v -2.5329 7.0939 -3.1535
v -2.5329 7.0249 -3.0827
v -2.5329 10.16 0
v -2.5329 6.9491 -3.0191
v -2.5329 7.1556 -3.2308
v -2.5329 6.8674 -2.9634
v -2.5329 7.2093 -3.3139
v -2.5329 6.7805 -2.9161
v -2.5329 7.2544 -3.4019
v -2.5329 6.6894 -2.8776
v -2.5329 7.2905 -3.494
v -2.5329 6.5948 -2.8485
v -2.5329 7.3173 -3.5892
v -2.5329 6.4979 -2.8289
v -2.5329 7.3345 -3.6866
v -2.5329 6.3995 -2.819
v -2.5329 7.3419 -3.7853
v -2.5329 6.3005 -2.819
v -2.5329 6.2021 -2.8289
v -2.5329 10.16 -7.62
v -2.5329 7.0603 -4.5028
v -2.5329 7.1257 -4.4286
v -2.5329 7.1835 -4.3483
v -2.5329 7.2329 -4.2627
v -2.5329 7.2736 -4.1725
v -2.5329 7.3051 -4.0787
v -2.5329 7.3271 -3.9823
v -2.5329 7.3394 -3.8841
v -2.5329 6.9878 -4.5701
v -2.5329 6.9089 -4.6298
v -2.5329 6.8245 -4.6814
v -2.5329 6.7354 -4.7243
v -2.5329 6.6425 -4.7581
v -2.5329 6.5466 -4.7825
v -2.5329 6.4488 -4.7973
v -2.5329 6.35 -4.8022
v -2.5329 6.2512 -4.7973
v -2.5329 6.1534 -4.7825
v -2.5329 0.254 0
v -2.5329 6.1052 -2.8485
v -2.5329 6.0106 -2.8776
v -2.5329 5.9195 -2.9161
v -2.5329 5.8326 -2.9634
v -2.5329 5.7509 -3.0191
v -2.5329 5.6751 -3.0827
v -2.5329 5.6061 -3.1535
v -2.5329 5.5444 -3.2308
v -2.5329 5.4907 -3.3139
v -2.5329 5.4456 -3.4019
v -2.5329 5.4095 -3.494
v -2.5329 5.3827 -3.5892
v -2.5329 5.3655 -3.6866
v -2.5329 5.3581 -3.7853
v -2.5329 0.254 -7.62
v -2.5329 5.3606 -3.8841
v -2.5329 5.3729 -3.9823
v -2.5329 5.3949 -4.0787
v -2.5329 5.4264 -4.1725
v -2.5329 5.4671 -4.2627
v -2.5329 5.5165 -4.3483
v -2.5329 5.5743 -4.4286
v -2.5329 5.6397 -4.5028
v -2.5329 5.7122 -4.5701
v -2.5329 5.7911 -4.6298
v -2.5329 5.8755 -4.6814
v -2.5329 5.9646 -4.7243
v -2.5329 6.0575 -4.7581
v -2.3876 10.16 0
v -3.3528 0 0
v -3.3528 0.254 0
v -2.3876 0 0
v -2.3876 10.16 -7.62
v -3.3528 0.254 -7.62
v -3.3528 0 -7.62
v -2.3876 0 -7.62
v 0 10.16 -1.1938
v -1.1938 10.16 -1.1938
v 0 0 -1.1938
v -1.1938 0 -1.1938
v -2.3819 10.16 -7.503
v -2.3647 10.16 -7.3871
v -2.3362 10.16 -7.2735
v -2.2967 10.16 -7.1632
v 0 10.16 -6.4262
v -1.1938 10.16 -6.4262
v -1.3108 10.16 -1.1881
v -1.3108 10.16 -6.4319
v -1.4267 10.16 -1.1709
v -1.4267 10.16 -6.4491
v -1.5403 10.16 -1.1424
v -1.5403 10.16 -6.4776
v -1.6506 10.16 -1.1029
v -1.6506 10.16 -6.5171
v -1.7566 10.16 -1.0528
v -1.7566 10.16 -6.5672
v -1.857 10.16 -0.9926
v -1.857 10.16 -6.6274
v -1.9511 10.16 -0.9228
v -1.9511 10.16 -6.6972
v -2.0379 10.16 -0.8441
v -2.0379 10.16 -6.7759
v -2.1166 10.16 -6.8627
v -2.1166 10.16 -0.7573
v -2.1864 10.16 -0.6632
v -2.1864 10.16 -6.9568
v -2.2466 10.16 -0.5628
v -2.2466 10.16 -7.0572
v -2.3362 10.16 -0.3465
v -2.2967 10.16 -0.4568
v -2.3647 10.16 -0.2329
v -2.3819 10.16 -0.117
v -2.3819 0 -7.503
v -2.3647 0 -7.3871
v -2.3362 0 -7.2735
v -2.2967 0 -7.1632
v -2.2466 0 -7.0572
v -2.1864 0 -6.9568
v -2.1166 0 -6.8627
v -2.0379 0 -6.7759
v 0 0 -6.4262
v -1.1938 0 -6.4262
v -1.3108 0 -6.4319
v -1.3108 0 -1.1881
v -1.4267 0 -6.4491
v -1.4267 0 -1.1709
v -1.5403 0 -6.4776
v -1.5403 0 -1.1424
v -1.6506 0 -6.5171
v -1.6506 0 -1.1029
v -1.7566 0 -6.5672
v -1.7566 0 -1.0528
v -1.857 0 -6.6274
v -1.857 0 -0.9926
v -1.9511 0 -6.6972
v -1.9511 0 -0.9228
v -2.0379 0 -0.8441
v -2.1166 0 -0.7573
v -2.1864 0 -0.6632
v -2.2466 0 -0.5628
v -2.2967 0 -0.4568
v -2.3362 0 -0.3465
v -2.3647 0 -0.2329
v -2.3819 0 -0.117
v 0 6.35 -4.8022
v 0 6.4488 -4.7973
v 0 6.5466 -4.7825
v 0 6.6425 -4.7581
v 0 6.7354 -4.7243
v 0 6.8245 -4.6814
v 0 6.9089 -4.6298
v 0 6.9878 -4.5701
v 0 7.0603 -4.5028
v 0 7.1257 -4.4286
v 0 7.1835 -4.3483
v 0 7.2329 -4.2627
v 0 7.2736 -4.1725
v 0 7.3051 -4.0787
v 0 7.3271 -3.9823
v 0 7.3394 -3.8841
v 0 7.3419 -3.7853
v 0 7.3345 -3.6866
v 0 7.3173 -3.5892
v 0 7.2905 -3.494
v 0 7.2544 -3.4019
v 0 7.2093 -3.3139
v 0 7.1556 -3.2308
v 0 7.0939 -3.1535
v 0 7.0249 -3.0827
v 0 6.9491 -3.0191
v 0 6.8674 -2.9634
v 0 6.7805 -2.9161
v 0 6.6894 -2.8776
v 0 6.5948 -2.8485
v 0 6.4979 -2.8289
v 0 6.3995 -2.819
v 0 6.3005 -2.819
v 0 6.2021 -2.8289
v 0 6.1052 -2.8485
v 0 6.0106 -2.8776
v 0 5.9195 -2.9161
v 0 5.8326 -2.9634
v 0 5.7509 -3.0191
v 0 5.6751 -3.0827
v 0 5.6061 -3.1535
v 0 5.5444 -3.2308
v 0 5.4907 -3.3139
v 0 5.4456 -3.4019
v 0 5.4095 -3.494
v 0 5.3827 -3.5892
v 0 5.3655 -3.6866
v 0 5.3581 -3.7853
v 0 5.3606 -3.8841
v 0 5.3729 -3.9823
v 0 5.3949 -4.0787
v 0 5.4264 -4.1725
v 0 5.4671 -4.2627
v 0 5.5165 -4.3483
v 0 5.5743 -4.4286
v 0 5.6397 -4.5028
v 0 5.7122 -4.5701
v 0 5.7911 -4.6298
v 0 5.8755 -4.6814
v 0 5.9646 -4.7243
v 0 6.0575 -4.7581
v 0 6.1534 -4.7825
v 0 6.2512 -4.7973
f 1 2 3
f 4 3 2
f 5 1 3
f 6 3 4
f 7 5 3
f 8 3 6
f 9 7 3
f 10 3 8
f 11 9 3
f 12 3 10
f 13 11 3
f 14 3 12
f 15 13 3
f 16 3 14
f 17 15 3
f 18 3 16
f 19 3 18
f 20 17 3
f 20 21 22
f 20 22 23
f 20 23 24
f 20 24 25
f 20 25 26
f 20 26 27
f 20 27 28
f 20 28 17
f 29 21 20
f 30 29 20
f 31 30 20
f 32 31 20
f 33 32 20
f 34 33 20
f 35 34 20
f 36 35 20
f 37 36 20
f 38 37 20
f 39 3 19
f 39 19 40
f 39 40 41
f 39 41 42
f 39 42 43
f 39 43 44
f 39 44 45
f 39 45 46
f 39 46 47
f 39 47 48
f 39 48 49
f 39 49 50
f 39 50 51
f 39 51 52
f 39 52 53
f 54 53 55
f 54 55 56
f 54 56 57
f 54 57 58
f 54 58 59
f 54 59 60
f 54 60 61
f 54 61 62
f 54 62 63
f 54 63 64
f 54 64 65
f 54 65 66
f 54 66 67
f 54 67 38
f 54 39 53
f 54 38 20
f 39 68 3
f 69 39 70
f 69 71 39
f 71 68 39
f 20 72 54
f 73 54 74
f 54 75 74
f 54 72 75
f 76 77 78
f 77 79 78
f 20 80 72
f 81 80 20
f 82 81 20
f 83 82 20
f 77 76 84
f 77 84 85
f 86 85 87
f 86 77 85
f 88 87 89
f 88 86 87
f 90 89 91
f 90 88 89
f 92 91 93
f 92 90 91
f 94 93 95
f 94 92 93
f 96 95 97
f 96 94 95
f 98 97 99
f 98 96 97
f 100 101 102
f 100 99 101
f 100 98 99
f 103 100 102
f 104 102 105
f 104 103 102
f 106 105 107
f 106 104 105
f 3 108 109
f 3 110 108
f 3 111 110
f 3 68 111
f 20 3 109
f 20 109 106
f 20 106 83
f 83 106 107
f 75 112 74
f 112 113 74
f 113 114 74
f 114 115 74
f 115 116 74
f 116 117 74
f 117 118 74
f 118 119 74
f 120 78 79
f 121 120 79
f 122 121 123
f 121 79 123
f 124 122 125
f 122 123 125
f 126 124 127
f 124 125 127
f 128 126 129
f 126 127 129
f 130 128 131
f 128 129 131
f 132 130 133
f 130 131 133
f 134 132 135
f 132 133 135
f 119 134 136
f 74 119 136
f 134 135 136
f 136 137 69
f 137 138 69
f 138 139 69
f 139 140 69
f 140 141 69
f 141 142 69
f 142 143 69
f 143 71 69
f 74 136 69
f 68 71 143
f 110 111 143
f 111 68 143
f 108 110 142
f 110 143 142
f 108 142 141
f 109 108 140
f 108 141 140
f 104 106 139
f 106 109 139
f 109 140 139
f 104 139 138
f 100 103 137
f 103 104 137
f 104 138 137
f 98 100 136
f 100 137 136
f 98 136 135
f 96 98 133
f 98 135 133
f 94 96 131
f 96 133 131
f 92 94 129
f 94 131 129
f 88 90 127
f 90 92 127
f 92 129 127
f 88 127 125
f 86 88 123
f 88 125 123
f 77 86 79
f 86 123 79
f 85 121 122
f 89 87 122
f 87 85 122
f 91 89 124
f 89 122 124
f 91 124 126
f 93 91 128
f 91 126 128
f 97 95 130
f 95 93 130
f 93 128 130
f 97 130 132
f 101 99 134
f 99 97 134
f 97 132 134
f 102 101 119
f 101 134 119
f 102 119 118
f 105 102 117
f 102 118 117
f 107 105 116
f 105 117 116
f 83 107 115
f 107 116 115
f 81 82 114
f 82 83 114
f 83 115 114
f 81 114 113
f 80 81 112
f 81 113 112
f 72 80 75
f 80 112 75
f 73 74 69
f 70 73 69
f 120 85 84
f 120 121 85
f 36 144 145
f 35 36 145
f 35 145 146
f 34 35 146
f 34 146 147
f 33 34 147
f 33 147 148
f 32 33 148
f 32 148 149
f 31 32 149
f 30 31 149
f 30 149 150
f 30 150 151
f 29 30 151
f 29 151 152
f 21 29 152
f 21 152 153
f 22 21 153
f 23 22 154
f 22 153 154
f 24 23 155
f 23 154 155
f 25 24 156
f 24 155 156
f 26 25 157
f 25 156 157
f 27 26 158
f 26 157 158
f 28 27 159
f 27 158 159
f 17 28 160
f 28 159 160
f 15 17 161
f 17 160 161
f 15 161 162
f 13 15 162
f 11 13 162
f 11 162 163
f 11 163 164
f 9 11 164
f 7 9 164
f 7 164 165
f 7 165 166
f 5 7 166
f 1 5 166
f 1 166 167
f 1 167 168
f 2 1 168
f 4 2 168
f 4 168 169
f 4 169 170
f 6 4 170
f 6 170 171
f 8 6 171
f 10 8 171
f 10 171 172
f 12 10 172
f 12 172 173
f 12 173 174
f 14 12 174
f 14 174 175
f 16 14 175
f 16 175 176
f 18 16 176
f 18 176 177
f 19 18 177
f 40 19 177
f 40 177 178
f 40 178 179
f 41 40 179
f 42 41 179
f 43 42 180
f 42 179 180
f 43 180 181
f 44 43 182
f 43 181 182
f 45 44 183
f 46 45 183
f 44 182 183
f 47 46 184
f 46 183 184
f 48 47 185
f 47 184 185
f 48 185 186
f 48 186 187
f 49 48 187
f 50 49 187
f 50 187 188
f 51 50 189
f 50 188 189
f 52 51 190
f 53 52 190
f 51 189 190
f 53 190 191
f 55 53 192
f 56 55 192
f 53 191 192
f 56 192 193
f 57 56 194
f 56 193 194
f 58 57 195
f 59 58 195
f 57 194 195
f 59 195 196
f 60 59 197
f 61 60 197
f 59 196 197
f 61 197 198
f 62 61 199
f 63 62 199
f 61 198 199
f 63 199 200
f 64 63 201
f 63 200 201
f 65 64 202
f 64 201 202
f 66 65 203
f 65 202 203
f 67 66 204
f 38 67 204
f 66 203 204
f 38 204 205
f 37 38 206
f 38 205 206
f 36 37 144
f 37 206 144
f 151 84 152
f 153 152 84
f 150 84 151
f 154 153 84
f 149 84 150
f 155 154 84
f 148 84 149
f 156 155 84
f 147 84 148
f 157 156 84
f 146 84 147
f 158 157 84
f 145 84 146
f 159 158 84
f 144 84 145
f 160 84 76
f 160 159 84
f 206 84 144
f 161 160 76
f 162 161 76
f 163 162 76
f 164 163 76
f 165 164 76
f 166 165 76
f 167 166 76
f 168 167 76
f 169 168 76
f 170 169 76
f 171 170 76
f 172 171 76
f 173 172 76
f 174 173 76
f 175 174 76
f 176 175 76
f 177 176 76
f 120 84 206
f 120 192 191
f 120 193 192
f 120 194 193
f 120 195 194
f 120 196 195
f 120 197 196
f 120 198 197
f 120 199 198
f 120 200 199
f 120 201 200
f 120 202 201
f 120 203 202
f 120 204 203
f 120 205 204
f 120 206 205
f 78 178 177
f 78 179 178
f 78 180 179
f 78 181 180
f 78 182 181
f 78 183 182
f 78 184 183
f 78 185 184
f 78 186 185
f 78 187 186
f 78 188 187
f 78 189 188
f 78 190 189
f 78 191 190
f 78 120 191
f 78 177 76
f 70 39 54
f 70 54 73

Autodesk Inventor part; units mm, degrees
ref_plane "YZ Plane" through (0, 0, 0) normal (1, 0, 0) x (0, 1, 0)
ref_plane "XZ Plane" through (0, 0, 0) normal (0, 1, 0) x (-1, 0, 0)
ref_plane "XY Plane" through (0, 0, 0) normal (0, 0, 1) x (1, 0, 0)
sketch "Sketch1" plane through (0, 0, 0) normal (0, 1, 0) x (-1, 0, 0)
  line L0 (0, -6.4262) -> (0, -1.1938)
  arc A0 (1.1938, -1.1938) -> (2.3876, 0) centre (1.1938, 0) ccw
  arc A1 (2.3876, -7.62) -> (1.1938, -6.4262) centre (1.1938, -7.62) ccw
  line L1 (2.3876, 0) -> (2.5329, 0)
  line L2 (2.5329, 0) -> (2.5329, -7.62)
  line L3 (2.5329, -7.62) -> (2.3876, -7.62)
  line L4 (1.1938, -6.4262) -> (0, -6.4262)
  line L5 (1.1938, -1.1938) -> (0, -1.1938)
  line L6 (0, 0) -> (3.3528, 0)
  line L7 (0, -3.81) -> (2.5329, -3.81)
  line L8 (0, -7.62) -> (3.3528, -7.62)
  line L9 (3.3528, -7.62) -> (3.3528, 0)
  dimension "d2" = 2.3876
  dimension "d3" = 2.3876
  dimension "d12" = 3.3528
extrude "Extrusion1" add sketch "Sketch1" along normal blind 10.16 contours L0 L7 L2 L3 A1 L4 | L0 L5 A0 L1 L2 L7
sketch "Sketch2" plane through (0, 0, -1.1938) normal (1, 0, 0) x (0, 0, -1)
  circle A0 centre (2.6162, 6.35) radius 0.9922
  line L0 (0, 0) -> (5.2324, 0) projected
  point P0 (-1.1938, 0)
  dimension "d8" = 1.9844
  dimension "d9" = 6.35
extrude "Extrusion3" cut sketch "Sketch2" against normal blind 127
extrude "Extrusion4" add sketch "Sketch1" along normal blind 0.254 contours L2 L6 L9 L8
properties part number "Ease of Model Bearing"
